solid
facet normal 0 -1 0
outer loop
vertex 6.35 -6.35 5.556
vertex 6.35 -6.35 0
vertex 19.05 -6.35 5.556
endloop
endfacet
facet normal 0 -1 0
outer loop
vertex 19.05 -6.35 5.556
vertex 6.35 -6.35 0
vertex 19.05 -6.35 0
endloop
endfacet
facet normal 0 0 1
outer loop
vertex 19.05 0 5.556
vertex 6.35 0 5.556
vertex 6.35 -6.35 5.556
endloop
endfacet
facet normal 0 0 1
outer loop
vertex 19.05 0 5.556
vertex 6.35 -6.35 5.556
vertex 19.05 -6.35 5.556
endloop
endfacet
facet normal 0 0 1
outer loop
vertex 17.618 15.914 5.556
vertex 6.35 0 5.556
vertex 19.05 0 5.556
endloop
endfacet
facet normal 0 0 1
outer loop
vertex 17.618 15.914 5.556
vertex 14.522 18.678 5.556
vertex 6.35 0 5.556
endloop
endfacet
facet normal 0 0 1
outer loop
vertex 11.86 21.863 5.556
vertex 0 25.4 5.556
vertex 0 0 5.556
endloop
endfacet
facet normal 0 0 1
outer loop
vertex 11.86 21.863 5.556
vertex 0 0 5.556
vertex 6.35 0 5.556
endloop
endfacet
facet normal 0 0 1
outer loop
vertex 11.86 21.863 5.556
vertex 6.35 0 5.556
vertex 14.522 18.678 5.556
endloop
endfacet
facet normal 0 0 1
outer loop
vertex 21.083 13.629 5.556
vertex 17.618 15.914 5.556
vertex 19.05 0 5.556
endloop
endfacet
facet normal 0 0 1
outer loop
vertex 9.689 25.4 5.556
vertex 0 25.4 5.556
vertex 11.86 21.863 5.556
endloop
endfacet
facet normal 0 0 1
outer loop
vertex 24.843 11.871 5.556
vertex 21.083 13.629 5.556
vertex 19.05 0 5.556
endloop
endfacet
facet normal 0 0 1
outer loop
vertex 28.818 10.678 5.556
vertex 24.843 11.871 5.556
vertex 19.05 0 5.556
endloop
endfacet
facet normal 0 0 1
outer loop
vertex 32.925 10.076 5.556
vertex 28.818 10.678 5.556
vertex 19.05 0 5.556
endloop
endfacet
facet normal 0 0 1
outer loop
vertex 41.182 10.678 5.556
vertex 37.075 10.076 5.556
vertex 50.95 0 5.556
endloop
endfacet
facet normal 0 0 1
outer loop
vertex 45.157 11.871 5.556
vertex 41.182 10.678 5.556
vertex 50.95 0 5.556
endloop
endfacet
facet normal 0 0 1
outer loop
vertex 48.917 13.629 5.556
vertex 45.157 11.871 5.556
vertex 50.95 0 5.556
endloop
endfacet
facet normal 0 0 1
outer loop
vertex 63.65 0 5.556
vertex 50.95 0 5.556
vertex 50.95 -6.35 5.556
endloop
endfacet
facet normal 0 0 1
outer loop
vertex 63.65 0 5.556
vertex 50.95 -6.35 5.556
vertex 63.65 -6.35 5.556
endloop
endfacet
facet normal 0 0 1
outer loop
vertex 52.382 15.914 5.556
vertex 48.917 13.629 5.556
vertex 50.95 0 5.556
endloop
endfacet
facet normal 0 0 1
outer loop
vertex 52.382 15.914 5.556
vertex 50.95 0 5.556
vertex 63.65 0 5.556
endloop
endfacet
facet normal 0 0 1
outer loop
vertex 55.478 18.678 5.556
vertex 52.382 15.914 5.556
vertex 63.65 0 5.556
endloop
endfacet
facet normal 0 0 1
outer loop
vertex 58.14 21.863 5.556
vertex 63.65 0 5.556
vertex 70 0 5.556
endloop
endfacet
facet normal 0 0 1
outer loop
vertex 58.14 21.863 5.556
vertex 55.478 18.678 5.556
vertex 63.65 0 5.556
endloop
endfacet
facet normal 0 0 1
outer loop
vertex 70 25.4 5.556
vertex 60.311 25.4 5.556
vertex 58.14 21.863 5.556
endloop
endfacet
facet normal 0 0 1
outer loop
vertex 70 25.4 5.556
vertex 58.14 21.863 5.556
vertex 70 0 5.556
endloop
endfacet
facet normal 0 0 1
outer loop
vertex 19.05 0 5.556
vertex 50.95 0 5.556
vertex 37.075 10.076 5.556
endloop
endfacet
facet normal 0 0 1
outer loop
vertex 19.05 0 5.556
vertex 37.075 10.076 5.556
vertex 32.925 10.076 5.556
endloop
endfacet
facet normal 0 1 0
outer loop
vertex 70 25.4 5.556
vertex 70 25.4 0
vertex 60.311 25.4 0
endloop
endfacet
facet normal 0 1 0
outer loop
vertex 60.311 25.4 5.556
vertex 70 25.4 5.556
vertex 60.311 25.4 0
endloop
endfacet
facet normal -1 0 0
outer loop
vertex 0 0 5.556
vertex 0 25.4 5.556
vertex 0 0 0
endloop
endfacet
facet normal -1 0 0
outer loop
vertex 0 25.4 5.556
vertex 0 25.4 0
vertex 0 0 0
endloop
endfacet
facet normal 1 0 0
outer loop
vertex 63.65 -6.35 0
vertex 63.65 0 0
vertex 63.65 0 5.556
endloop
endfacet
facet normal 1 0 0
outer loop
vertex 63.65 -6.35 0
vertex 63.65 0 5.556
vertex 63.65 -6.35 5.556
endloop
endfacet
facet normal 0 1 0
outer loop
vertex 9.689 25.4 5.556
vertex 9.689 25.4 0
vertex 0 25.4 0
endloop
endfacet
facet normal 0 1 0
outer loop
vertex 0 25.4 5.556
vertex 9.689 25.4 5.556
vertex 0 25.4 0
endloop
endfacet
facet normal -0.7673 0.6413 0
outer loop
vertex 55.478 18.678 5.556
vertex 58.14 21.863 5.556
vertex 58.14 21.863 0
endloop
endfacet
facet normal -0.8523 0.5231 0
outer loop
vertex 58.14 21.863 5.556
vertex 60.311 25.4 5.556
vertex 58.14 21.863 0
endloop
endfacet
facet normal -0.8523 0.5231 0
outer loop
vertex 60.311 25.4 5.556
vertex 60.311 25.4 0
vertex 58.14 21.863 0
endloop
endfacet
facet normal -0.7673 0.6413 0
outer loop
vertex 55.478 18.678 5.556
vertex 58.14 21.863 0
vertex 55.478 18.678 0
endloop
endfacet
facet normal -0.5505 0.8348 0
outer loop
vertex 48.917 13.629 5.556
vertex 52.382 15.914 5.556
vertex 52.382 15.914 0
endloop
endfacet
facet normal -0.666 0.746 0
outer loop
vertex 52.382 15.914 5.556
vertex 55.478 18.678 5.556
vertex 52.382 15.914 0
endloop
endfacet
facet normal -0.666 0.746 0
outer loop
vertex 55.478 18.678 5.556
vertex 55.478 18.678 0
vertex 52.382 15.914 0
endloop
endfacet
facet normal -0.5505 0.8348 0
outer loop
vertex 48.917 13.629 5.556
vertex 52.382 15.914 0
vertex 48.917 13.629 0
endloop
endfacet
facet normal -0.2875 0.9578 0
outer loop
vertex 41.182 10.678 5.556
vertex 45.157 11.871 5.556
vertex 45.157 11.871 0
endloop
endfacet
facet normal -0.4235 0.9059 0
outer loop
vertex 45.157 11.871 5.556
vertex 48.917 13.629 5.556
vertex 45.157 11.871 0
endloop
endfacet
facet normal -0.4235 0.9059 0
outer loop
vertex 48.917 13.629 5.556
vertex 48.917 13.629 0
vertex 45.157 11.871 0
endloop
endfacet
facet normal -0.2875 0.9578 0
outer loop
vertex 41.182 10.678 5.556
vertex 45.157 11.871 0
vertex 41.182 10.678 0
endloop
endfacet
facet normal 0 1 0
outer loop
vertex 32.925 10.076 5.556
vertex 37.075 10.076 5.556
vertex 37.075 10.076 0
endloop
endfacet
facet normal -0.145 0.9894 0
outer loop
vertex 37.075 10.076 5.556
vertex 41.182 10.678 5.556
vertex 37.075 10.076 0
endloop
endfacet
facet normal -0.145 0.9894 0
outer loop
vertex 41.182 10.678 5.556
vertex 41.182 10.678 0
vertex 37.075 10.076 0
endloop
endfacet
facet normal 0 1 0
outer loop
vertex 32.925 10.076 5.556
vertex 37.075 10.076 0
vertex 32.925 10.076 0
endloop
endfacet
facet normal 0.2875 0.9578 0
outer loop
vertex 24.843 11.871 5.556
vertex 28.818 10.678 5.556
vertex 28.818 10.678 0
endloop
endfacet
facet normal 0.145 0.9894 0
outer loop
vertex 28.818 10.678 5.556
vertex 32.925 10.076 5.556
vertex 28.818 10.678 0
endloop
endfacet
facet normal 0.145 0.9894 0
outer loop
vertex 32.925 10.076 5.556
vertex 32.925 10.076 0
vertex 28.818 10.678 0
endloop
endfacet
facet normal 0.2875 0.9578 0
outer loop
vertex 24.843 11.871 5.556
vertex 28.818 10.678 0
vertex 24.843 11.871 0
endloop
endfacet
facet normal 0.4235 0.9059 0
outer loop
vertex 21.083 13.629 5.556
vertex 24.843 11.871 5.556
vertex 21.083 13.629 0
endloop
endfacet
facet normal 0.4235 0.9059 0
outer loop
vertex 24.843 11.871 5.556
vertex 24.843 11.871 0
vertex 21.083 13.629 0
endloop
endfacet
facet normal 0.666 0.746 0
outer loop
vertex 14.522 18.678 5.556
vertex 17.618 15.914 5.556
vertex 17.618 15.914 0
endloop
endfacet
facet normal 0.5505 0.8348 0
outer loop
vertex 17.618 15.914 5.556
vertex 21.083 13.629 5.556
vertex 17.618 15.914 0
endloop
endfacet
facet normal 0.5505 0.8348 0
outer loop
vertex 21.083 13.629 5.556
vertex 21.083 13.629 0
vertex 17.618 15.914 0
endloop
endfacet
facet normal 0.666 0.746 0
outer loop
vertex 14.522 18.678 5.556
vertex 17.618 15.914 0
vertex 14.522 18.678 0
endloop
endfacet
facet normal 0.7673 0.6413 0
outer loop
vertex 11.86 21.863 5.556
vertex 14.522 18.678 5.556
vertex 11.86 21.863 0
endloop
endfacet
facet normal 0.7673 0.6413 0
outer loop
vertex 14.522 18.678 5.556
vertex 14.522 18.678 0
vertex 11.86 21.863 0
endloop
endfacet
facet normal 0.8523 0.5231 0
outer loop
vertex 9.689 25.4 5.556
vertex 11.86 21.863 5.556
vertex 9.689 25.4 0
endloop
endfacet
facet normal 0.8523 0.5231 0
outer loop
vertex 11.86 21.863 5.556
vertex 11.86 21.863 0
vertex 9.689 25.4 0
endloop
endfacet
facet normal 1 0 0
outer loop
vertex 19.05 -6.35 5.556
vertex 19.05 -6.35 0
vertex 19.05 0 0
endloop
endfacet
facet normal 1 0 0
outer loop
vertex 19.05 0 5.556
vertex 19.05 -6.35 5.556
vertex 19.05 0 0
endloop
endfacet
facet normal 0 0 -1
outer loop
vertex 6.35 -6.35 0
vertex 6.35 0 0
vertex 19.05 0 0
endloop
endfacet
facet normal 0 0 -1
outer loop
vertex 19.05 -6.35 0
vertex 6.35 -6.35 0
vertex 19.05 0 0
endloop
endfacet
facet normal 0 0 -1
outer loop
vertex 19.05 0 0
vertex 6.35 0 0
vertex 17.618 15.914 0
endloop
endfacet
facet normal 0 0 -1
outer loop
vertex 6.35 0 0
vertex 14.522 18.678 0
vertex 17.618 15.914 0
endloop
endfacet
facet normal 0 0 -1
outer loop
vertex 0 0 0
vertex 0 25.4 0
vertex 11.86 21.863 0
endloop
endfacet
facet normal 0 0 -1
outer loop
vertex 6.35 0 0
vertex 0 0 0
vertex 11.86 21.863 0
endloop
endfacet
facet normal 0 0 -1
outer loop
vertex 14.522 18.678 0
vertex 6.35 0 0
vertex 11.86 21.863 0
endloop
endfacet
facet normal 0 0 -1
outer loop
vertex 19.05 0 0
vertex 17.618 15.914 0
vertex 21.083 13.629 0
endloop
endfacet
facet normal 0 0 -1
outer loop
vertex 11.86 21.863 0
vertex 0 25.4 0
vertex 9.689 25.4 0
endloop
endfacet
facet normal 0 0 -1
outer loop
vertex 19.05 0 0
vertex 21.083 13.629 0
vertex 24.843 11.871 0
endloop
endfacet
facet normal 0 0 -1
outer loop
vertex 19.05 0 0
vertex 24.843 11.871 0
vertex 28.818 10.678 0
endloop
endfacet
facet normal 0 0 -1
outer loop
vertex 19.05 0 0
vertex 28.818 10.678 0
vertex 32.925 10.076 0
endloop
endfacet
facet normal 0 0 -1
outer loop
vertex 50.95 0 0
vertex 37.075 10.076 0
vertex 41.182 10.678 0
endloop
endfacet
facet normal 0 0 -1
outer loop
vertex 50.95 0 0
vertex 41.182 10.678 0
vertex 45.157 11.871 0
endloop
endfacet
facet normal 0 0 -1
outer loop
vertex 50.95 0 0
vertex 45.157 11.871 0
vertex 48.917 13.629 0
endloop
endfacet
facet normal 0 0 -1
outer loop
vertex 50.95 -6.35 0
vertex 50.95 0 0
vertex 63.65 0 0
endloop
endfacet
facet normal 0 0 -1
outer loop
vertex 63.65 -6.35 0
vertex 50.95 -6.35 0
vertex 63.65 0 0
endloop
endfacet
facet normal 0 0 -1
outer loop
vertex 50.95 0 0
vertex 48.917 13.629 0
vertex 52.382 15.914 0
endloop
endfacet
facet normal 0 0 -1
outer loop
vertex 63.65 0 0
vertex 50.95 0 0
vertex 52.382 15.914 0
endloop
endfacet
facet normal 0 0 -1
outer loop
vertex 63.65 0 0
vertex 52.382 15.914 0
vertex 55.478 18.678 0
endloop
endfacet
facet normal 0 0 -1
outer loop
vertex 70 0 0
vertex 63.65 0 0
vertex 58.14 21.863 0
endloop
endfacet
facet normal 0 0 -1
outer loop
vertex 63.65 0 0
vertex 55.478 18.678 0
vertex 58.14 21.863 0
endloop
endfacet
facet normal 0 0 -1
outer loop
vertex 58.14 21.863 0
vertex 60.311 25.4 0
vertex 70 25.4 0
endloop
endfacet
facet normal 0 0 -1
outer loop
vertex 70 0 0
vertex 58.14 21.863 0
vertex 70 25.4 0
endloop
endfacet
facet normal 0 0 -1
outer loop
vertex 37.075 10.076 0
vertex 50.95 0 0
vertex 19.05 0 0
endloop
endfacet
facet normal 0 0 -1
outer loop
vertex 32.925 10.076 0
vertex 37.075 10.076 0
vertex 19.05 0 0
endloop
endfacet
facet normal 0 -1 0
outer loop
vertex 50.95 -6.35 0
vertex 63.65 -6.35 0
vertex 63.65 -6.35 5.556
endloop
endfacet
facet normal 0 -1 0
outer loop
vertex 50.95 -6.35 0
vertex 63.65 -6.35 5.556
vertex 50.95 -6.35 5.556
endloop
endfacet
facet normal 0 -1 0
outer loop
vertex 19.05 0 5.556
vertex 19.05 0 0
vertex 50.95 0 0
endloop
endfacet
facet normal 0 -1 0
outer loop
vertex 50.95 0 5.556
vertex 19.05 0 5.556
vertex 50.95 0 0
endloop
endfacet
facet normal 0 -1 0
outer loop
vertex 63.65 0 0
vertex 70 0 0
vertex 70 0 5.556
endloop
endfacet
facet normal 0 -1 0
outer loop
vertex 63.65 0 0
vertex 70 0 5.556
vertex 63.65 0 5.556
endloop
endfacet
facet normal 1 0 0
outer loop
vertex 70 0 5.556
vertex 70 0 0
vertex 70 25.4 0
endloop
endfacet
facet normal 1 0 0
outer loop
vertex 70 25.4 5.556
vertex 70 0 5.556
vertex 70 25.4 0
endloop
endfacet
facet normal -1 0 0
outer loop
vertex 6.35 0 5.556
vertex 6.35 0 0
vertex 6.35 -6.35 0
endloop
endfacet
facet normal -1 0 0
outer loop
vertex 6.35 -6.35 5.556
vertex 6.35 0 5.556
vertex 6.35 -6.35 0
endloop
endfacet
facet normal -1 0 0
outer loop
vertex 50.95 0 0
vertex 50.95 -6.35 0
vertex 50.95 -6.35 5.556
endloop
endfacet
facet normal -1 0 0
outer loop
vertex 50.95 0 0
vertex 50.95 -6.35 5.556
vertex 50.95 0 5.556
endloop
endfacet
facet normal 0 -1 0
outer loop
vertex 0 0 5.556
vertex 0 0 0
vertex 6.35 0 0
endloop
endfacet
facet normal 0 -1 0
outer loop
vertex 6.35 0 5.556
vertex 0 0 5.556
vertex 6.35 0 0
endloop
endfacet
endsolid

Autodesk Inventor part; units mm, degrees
ref_plane "YZ Plane" through (0, 0, 0) normal (1, 0, 0) x (0, 1, 0)
ref_plane "XZ Plane" through (0, 0, 0) normal (0, 1, 0) x (-1, 0, 0)
ref_plane "XY Plane" through (0, 0, 0) normal (0, 0, 1) x (1, 0, 0)
sketch "Sketch1" plane through (0, 0, 0) normal (0, 0, 1) x (1, 0, 0)
  line L0 (70, 0) -> (70, 25.4)
  line L1 (0, 25.4) -> (0, 0)
  arc A0 (9.6891, 25.4) -> (60.3109, 25.4) centre (35, 38.5) ccw
  line L2 (70, 25.4) -> (60.3109, 25.4)
  line L3 (9.6891, 25.4) -> (0, 25.4)
  line L4 (0, 0) -> (6.35, 0)
  line L5 (6.35, 0) -> (6.35, -6.35)
  line L6 (6.35, -6.35) -> (19.05, -6.35)
  line L7 (19.05, -6.35) -> (19.05, 0)
  line L8 (70, 0) -> (63.65, 0)
  line L9 (63.65, 0) -> (63.65, -6.35)
  line L10 (63.65, -6.35) -> (50.95, -6.35)
  line L11 (50.95, -6.35) -> (50.95, 0)
  line L12 (0, 0) -> (6.35, 0)
  line L13 (19.05, 0) -> (50.95, 0)
  line L14 (63.65, 0) -> (70, 0)
  dimension "d1" = 25.4
  dimension "d6" = 6.35
  dimension "d7" = 12.7
  dimension "d8" = 6.35
  dimension "d9" = 6.35
  dimension "d10" = 12.7
extrude "Extrusion1" add sketch "Sketch1" along normal blind 5.5563
properties part number "auger_holder"
